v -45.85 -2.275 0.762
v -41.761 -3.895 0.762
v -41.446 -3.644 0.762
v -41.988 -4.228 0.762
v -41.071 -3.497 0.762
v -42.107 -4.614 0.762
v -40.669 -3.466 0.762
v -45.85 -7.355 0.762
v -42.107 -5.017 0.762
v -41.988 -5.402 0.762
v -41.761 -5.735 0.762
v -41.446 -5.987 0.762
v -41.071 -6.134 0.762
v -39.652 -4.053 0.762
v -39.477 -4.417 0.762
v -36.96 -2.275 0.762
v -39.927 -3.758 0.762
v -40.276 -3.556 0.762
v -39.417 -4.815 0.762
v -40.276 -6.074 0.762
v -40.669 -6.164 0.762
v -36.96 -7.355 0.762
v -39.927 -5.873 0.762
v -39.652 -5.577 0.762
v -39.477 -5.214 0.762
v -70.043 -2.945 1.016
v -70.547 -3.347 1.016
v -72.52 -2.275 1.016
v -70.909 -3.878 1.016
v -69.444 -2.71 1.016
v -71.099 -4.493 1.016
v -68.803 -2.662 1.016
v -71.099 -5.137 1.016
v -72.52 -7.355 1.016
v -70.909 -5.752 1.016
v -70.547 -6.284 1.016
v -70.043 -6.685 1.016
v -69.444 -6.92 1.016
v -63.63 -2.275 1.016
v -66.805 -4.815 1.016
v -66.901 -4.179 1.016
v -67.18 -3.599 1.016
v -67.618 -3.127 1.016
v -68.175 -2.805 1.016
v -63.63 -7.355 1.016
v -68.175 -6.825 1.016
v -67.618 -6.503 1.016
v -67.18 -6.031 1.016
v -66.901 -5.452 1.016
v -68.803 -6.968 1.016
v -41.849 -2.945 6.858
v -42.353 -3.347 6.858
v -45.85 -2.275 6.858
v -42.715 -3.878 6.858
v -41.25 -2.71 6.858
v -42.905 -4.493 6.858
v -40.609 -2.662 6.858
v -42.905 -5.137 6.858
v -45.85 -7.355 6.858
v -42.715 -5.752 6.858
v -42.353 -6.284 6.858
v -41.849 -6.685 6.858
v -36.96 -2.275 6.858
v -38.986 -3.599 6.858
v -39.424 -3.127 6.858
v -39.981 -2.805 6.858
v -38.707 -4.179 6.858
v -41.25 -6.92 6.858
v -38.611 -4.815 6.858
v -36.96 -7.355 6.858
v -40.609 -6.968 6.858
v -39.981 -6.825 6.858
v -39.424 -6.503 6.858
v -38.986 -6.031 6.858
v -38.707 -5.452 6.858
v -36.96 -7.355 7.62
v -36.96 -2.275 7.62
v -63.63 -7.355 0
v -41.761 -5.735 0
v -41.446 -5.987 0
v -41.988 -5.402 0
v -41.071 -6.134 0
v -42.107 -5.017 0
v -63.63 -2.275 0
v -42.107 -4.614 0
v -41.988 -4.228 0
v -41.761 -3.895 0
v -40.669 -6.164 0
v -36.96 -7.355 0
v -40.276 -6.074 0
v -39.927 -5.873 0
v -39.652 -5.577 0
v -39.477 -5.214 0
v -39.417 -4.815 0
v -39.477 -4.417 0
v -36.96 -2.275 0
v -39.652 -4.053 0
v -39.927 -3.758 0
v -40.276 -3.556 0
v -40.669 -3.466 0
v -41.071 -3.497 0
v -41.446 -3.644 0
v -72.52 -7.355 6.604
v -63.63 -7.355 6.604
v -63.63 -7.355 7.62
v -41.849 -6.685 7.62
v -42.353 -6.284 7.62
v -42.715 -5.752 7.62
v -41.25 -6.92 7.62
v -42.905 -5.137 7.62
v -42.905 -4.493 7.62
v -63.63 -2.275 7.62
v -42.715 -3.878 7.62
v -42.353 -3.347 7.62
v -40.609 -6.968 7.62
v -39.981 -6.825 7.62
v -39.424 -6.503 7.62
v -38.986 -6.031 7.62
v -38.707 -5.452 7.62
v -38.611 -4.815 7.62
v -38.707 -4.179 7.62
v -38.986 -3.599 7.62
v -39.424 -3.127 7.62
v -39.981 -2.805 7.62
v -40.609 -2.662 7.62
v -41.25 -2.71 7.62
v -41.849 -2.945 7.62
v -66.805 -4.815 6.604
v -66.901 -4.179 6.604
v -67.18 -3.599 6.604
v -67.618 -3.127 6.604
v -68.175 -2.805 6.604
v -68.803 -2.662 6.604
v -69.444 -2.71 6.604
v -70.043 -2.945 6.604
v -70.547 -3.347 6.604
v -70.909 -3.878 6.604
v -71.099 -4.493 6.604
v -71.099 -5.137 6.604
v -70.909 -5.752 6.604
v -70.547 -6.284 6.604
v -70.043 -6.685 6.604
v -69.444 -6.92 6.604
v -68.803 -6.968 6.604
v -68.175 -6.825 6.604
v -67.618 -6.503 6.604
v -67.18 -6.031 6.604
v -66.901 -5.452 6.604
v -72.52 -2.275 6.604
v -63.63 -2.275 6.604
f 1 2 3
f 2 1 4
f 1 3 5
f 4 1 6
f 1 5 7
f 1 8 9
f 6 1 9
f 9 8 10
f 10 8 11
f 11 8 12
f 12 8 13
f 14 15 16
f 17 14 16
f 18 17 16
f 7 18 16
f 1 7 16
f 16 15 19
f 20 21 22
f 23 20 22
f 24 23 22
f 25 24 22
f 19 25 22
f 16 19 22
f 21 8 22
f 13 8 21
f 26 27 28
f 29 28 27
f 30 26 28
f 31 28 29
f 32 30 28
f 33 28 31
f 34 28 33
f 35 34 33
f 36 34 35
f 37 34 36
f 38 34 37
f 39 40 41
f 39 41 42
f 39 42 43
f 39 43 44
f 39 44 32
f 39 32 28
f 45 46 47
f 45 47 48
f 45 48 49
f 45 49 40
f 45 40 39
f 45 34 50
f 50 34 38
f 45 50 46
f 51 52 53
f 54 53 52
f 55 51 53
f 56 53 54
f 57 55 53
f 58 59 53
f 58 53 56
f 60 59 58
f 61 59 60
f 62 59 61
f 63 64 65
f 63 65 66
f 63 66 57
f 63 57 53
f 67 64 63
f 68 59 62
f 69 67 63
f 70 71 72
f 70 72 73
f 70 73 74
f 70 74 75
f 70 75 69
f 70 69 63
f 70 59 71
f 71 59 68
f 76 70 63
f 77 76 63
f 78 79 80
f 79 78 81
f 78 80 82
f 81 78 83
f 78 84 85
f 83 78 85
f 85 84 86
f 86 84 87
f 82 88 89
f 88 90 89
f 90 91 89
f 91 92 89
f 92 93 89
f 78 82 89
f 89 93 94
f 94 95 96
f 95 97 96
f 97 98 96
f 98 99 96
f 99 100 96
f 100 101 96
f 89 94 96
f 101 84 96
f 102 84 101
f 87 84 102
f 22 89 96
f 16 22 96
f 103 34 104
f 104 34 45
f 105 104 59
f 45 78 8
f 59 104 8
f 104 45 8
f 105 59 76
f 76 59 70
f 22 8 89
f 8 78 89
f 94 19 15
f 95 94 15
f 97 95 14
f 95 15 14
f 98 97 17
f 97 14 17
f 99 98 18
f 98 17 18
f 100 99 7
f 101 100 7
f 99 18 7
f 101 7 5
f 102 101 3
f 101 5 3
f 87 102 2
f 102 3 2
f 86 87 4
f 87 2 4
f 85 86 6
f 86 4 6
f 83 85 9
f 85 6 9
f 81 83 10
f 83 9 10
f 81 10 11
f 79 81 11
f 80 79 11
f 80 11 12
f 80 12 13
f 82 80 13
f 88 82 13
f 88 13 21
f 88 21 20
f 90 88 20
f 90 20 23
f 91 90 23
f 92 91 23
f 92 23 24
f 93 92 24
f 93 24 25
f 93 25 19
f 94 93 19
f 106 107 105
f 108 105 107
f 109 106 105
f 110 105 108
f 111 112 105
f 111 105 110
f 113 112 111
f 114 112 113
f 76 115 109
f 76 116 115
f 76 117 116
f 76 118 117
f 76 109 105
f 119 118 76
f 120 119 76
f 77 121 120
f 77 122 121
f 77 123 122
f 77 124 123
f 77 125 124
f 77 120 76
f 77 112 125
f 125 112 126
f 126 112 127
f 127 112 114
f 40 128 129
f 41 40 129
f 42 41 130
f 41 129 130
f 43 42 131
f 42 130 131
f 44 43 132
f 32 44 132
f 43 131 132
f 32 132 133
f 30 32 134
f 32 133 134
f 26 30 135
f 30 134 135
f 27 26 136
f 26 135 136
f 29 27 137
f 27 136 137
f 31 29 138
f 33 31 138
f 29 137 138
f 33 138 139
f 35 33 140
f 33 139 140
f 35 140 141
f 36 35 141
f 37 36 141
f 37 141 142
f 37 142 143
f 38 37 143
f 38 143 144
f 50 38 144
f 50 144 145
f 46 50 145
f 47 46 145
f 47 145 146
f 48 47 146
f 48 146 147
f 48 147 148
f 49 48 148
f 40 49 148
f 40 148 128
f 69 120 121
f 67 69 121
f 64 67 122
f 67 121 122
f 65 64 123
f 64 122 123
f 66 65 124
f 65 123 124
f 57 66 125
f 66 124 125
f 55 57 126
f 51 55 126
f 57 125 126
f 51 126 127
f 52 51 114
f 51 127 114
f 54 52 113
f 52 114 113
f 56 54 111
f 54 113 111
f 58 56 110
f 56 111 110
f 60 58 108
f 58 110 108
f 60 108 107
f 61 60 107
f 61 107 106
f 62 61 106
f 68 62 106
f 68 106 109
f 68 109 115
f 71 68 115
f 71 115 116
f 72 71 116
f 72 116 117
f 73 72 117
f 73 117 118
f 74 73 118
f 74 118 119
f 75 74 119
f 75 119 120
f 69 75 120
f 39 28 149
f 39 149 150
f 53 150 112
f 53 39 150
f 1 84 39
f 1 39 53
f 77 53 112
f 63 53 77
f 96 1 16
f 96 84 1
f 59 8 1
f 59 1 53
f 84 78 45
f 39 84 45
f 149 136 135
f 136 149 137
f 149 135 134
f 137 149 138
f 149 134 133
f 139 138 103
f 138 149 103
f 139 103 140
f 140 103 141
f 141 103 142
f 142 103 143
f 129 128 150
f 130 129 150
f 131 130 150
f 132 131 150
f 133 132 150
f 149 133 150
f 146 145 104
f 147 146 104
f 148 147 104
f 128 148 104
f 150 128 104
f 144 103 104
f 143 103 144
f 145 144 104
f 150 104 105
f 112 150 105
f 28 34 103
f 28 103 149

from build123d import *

# Parameters (mm, degrees)
SKETCH2_W                 = 35.56
SKETCH2_H                 = 5.08
BOSS_EXTRUDE1_DEPTH       = 7.62
SKETCH7_W                 = 8.89
SKETCH7_H                 = 6.096
SKETCH7_H_2               = 1.016
CUT_EXTRUDE2_DEPTH        = 6.08
CUT_EXTRUDE3_REACH        = 9.62
SKETCH8_R                 = 2.159
SKETCH9_R                 = 2.159
CUT_EXTRUDE4_DEPTH        = 7.604
F_6_32_TAPPED_HOLE1_D     = 2.7051
F_6_32_TAPPED_HOLE1_DEPTH = 0.762


with BuildPart() as part:
    # Sketch2 → Boss-Extrude1 (new body)
    with BuildSketch(Plane.XY):
        with Locations((-54.739863719, -4.815217495)):
            Rectangle(SKETCH2_W, SKETCH2_H)
    extrude(amount=BOSS_EXTRUDE1_DEPTH)

    # Sketch7 → Cut-Extrude2 (cut, through all)
    with BuildSketch(Plane.XZ.offset(7.355217495)):
        with Locations((-41.404863719, 3.81)):
            Rectangle(SKETCH7_W, SKETCH7_H)
        with Locations((-68.074863719, 0.508)):
            Rectangle(SKETCH7_W, SKETCH7_H_2)
        with Locations((-68.074863719, 7.112)):
            Rectangle(SKETCH7_W, SKETCH7_H_2)
    extrude(amount=-CUT_EXTRUDE2_DEPTH, mode=Mode.SUBTRACT)

    # Sketch8 → Cut-Extrude3 (cut, up to next)
    with BuildSketch(Plane.XY.offset(7.62), mode=Mode.PRIVATE) as cut_extrude3_sk1:
        with Locations((-40.769863719, -4.815217495)):
            Circle(SKETCH8_R)
    cut_extrude3_tool1 = extrude(cut_extrude3_sk1.sketch, amount=-CUT_EXTRUDE3_REACH, mode=Mode.PRIVATE) & part.part
    add(cut_extrude3_tool1.solids().sort_by_distance((-40.769864, -4.815217, 7.62))[0], mode=Mode.SUBTRACT)

    # Sketch9 → Cut-Extrude4 (cut, through all)
    with BuildSketch(Plane.XY.offset(6.604)):
        with Locations((-68.963863719, -4.815217495)):
            Circle(SKETCH9_R)
    extrude(amount=-CUT_EXTRUDE4_DEPTH, mode=Mode.SUBTRACT)

    # #6-32 Tapped Hole1
    with Locations(Plane(origin=(0, 0, 0), x_dir=(-1, 0, 0), z_dir=(0, 0, -1))):
        with Locations((40.769863719, -4.815217495)):
            Hole(F_6_32_TAPPED_HOLE1_D / 2, depth=F_6_32_TAPPED_HOLE1_DEPTH)


solid = part.part
